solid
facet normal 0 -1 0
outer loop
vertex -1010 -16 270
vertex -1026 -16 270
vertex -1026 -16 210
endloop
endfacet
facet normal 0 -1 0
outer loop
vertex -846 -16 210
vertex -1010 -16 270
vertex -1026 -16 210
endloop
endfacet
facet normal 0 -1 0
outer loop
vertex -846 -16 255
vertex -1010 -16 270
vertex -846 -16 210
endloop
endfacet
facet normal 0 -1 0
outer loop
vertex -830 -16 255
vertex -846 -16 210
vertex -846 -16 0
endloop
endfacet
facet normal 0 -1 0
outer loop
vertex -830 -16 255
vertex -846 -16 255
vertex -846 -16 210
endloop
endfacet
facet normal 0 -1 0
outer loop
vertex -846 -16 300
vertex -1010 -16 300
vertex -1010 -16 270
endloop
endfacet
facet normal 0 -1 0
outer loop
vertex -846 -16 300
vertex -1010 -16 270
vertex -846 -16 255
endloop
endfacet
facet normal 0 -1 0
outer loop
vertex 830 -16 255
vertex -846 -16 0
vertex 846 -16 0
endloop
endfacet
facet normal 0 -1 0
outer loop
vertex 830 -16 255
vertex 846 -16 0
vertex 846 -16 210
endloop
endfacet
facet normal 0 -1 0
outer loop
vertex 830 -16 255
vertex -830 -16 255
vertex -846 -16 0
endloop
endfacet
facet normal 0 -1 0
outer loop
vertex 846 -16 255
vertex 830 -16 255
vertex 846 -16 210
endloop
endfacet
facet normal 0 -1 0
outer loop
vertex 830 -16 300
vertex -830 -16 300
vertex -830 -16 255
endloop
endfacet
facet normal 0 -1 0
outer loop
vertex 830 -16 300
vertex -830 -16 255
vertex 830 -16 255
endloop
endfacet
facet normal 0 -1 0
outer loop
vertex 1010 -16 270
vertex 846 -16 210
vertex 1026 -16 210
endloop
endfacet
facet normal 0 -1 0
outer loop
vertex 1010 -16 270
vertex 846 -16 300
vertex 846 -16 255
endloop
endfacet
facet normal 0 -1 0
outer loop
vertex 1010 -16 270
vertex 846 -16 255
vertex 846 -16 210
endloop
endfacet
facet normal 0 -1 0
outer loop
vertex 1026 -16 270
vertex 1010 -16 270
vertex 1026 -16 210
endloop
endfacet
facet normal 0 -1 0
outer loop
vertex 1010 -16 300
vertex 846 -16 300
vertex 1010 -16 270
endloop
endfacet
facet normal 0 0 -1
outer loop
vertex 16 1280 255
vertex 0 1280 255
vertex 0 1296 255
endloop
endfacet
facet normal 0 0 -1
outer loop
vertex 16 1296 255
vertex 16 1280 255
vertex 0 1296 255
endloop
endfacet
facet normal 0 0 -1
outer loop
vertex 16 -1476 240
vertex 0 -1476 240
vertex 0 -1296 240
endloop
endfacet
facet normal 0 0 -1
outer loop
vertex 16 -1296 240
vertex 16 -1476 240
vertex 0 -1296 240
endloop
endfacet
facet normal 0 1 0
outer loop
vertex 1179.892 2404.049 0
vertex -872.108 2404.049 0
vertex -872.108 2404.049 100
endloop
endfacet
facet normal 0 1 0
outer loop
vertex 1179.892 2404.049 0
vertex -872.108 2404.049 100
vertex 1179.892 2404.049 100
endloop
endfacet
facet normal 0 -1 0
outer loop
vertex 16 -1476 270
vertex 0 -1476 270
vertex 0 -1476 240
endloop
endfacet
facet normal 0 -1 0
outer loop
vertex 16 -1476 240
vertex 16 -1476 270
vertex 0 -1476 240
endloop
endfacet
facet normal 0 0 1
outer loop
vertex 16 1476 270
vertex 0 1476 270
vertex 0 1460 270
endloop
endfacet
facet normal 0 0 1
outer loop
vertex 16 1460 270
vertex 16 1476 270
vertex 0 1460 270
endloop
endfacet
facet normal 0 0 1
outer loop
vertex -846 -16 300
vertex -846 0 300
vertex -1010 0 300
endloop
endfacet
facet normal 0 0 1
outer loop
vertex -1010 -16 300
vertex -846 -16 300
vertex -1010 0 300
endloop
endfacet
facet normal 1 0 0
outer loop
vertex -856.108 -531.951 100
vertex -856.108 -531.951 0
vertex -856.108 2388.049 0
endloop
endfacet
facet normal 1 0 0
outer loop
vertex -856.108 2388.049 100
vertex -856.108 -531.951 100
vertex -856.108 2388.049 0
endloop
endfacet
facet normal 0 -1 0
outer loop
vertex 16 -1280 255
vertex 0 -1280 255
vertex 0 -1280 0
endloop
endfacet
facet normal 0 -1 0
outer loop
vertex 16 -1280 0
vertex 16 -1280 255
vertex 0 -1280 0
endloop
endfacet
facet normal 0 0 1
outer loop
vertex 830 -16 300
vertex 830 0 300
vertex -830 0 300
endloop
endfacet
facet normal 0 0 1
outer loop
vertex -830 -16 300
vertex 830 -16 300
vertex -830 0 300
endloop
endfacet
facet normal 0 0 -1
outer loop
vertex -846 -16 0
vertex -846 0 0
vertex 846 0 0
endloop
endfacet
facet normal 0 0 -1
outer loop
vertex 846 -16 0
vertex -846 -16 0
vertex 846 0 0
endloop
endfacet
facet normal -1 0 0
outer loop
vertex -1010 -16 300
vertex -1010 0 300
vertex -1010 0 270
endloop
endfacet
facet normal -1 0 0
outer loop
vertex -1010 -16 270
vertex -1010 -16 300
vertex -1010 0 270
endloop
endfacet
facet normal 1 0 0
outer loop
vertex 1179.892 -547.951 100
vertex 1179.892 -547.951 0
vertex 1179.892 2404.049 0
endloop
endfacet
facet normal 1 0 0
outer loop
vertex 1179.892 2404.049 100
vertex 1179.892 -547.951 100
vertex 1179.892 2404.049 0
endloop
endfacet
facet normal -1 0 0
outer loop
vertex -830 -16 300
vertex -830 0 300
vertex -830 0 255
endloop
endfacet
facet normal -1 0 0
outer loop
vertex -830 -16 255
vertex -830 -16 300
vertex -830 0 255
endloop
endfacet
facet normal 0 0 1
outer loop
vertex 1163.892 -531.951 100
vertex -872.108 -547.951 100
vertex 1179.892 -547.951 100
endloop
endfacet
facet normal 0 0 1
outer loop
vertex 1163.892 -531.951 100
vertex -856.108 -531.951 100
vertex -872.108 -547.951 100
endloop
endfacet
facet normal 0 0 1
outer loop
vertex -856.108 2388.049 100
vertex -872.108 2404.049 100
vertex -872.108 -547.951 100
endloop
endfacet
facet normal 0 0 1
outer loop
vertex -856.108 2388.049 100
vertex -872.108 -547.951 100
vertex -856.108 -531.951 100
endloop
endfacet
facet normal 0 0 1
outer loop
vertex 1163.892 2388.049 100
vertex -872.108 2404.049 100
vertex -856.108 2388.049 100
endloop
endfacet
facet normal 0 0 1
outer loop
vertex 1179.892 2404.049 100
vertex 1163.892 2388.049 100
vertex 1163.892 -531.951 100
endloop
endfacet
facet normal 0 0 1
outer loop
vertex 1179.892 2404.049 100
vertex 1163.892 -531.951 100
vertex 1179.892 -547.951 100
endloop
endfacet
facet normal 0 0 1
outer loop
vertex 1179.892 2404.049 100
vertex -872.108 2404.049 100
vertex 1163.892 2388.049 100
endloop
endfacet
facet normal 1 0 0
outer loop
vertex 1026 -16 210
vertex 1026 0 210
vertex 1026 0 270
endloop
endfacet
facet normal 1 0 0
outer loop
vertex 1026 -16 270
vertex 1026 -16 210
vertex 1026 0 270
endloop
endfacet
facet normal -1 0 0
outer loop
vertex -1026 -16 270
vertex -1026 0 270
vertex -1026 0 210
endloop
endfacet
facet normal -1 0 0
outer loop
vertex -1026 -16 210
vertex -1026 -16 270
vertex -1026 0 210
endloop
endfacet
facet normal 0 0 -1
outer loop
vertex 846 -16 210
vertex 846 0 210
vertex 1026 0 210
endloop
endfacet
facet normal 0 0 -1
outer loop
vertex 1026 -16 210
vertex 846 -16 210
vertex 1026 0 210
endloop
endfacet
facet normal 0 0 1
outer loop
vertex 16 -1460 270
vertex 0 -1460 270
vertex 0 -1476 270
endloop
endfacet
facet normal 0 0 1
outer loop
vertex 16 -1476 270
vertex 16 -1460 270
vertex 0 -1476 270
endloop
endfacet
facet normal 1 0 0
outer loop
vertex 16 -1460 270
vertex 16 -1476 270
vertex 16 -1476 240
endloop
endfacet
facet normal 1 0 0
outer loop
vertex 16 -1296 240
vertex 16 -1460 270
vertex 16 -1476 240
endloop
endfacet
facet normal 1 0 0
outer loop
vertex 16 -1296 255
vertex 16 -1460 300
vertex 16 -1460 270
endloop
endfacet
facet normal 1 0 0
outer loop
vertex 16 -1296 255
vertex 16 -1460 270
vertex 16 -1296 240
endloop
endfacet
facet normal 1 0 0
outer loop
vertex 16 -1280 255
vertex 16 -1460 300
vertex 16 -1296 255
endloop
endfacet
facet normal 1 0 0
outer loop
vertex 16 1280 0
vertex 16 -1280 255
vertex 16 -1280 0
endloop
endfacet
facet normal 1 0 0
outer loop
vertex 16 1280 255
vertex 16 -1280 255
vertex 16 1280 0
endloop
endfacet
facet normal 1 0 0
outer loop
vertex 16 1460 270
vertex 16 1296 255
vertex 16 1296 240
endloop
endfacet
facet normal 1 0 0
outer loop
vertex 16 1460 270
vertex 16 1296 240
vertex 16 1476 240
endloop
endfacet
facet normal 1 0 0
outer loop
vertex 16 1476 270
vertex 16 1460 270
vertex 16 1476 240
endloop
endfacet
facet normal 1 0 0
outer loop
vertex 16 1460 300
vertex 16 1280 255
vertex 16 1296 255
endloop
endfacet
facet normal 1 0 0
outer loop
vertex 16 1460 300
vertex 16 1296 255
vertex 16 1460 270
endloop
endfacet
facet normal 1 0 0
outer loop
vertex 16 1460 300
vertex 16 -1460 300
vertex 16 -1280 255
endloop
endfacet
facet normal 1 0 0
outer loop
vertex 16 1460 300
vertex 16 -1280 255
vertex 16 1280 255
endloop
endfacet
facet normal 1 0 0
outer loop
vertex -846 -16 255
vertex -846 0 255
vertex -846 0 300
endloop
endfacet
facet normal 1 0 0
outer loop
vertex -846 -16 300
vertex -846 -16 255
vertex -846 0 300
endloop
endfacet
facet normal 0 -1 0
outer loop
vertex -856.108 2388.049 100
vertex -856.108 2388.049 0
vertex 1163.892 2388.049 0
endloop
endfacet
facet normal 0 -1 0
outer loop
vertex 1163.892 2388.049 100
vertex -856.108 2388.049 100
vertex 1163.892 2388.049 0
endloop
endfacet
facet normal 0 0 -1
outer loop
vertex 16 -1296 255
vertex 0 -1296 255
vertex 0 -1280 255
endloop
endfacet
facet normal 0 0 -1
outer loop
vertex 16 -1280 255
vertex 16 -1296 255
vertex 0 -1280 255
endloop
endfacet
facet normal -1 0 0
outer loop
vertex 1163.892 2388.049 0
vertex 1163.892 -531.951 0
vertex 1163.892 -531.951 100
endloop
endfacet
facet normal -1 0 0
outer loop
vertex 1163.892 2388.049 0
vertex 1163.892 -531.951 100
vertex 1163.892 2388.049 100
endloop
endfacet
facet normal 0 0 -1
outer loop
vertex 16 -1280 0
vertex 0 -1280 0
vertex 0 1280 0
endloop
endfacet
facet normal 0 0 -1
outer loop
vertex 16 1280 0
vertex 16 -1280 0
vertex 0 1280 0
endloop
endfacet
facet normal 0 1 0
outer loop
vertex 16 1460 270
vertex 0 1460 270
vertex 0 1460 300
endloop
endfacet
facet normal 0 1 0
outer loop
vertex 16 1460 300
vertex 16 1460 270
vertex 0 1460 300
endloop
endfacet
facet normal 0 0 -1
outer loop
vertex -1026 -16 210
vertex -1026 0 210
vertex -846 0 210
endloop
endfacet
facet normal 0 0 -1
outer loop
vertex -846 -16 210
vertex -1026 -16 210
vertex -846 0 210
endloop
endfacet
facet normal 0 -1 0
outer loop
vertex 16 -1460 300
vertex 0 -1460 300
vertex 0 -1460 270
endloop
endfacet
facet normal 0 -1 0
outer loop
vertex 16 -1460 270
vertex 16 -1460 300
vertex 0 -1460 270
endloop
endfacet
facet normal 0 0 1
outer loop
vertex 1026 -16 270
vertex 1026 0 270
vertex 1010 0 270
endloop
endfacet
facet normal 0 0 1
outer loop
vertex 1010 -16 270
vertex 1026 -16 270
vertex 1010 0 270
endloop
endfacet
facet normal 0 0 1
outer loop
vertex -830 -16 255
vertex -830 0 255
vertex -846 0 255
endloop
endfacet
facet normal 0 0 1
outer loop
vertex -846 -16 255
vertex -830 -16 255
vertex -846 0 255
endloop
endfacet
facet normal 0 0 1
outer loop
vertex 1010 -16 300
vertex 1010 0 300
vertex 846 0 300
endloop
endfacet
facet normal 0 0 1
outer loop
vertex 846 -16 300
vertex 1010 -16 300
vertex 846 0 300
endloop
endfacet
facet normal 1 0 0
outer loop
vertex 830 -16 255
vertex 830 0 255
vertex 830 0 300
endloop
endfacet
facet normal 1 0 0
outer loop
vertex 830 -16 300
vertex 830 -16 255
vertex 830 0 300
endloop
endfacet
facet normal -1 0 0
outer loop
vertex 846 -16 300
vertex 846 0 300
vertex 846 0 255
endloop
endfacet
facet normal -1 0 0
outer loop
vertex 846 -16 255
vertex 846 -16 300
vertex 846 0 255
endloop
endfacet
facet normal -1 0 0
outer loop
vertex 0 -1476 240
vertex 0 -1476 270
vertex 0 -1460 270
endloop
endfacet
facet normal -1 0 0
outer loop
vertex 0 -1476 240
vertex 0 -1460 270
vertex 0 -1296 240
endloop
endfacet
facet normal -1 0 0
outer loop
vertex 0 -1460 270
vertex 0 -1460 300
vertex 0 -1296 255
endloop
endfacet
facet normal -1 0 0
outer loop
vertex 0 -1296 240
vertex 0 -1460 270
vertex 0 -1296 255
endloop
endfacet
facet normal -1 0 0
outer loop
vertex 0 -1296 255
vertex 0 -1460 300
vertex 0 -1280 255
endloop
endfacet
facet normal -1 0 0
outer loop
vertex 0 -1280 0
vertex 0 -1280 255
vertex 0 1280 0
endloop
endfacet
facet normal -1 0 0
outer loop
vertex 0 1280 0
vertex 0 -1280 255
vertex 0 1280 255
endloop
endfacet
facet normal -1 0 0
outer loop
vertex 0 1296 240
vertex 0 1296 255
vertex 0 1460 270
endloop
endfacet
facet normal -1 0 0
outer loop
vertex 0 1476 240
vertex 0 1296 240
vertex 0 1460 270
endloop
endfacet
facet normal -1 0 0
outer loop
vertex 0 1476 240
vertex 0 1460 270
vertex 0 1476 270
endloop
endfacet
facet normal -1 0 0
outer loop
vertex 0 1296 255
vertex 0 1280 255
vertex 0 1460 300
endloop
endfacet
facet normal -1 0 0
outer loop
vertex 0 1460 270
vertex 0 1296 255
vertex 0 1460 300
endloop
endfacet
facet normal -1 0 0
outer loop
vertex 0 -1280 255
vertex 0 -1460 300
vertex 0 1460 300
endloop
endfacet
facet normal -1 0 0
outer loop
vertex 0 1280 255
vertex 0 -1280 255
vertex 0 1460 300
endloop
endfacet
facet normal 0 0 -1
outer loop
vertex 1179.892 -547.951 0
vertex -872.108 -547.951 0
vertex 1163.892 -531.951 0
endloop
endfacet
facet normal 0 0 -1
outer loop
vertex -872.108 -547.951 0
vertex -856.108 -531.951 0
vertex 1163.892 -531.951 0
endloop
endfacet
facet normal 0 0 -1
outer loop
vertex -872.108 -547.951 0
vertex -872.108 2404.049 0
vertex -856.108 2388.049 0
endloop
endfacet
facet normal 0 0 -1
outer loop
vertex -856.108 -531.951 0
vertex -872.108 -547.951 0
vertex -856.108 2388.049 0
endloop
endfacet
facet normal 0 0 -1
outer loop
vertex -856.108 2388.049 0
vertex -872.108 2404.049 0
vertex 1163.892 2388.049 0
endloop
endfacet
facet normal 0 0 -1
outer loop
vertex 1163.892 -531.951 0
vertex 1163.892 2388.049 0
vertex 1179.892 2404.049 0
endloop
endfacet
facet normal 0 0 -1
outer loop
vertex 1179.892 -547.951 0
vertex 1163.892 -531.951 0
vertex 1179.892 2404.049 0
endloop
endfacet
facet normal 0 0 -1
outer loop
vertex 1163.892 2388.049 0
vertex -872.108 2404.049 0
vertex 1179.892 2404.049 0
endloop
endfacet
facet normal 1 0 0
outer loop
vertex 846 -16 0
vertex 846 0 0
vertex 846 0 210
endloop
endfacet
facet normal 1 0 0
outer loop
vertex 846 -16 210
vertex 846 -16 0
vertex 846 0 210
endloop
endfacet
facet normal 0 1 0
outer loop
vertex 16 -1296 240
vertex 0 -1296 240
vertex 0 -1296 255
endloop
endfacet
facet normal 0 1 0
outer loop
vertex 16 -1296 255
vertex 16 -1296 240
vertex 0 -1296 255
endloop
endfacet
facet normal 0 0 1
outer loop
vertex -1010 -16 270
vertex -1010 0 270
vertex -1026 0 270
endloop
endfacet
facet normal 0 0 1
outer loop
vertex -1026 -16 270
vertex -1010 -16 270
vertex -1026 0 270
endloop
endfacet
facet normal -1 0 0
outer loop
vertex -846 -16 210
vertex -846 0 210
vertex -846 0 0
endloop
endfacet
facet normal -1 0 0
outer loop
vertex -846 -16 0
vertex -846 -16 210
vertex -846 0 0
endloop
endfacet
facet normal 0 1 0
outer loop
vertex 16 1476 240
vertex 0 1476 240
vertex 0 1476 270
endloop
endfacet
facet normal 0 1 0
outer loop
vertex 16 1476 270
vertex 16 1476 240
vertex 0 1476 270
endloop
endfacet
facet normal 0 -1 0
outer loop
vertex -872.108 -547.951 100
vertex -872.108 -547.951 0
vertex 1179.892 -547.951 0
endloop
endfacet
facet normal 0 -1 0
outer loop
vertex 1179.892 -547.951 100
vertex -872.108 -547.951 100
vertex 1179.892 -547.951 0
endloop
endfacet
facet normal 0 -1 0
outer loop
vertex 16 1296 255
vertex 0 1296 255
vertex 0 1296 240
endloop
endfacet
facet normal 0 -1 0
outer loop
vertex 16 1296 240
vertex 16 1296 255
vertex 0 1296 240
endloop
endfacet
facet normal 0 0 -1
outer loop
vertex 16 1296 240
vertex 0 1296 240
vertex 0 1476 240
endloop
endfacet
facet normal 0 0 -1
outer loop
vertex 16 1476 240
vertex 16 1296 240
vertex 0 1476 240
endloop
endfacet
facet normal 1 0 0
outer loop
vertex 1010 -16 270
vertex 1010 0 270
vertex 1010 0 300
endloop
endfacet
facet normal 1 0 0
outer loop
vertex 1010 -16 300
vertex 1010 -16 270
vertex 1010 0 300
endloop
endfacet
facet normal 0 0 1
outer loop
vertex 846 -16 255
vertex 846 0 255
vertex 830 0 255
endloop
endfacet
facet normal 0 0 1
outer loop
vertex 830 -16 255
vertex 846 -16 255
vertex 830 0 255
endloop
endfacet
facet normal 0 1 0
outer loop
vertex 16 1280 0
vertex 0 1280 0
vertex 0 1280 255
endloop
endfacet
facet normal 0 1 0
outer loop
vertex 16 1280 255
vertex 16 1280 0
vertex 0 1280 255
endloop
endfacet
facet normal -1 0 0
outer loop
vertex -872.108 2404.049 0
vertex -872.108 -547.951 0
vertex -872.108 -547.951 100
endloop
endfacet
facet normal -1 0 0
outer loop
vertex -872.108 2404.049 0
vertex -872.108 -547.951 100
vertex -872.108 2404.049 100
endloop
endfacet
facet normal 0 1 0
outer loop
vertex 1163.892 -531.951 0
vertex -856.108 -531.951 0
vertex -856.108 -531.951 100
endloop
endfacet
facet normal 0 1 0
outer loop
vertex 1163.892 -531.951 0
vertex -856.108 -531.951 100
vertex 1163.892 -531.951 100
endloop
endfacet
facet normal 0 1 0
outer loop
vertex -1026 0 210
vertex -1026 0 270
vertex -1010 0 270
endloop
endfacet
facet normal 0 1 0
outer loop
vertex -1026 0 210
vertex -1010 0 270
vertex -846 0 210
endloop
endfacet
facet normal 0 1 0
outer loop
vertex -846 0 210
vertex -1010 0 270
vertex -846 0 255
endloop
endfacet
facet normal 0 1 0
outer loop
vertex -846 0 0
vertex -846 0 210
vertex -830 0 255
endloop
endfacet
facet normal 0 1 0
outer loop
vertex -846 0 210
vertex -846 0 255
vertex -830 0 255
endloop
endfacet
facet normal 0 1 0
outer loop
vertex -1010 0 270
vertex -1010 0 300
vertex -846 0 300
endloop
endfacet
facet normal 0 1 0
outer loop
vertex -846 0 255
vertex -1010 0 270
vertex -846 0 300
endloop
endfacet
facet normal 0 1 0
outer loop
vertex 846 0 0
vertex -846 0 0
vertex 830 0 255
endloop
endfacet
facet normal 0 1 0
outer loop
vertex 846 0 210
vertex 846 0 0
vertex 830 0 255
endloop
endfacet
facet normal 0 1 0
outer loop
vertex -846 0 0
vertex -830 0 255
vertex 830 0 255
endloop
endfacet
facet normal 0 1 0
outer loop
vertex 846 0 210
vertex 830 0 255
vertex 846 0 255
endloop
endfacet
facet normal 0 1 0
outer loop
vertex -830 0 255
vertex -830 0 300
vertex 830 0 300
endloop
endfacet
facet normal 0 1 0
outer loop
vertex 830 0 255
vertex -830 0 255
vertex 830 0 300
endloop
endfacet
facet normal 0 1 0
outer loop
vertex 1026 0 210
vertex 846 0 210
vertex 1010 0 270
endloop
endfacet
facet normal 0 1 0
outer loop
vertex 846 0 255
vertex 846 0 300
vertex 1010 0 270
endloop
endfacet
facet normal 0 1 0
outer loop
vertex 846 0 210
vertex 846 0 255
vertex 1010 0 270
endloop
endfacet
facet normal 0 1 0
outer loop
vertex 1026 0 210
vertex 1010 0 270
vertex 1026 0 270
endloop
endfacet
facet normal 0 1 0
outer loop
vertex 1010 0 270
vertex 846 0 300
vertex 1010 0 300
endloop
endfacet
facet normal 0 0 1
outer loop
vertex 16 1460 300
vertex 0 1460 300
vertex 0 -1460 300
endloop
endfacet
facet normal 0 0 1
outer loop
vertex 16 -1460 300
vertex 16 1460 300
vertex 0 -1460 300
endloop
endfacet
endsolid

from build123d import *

# Parameters (mm, degrees)
F1_DEPTH = 16
F3_DEPTH = 16
F4_W     = 2052
F4_H     = 2952
F4_W_2   = 2020
F4_H_2   = 2920
F5_DEPTH = 100


with BuildPart() as f1:
    # F0 (on Front) → F1 (new body)
    with BuildSketch(Plane.XZ):
        Polygon((-846, 210), (-846, 0), (846, 0), (846, 210), (1026, 210), (1026, 270), (1010, 270), (1010, 300), (846, 300), (846, 255), (830, 255), (830, 300), (-830, 300), (-830, 255), (-846, 255), (-846, 300), (-1010, 300), (-1010, 270), (-1026, 270), (-1026, 210), align=None)
    extrude(amount=F1_DEPTH)


with BuildPart() as f3:
    # F2 (on Right) → F3 (new body)
    with BuildSketch(Plane.YZ):
        Polygon((-1280, 255), (-1280, 0), (1280, 0), (1280, 255), (1296, 255), (1296, 240), (1476, 240), (1476, 270), (1460, 270), (1460, 300), (-1460, 300), (-1460, 270), (-1476, 270), (-1476, 240), (-1296, 240), (-1296, 255), align=None)
    extrude(amount=F3_DEPTH)


with BuildPart() as f5:
    # F4 (on Top) → F5 (new body)
    with BuildSketch(Plane.XY):
        with Locations((153.89166, 928.048733)):
            Rectangle(F4_W, F4_H)
        with Locations((153.89166, 928.048733)):
            Rectangle(F4_W_2, F4_H_2, mode=Mode.SUBTRACT)
    extrude(amount=F5_DEPTH)


solid = Compound([f1.part, f3.part, f5.part])
